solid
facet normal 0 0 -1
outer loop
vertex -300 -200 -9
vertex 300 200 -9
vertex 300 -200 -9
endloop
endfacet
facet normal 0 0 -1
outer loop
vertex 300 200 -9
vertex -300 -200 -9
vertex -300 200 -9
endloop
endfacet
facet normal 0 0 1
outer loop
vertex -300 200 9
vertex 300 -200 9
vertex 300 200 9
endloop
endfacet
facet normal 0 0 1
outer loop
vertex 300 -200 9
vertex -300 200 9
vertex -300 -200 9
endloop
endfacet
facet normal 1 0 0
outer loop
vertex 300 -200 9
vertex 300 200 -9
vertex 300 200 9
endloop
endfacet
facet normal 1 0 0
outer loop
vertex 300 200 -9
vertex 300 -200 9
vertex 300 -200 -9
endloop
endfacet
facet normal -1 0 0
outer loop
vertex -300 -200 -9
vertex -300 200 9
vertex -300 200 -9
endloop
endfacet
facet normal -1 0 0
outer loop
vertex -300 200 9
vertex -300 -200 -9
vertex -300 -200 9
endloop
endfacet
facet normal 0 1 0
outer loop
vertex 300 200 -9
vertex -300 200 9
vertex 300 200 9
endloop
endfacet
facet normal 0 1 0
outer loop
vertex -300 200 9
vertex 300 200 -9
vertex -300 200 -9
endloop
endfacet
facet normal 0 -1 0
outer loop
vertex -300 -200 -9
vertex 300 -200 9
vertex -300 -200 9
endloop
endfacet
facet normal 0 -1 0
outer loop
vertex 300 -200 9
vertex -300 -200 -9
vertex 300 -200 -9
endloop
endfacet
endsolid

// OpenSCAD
// Parameters
sheet_length = 600; //[300:1200:1]
sheet_width = 400; //[200:800:1]
sheet_thickness = 18; //[9:36:1]
edge_chamfer = 1.5; //[0.5:3:0.1]
corner_rounding = 6; //[2:12:0.5]
label_thickness = 0.6; //[0.2:1.5:0.1]
label_length = 60; //[30:120:1]
label_width = 20; //[10:50:1]
connect_overlap = 1; //[0.5:2:0.1]

// MDF Sheet Panel with Corner Rounding and Edge Chamfer
module mdf_sheet_panel() {
  color([0.85, 0.85, 0.8]) {
    // Base panel
    translate([0, 0, 0])
      cube([sheet_length, sheet_width, sheet_thickness], center=true);

    // Corner rounding
    for (x = [-1, 1], y = [-1, 1]) {
      translate([x * (sheet_length/2 - corner_rounding), y * (sheet_width/2 - corner_rounding), 0])
        cylinder(r=corner_rounding, h=sheet_thickness, center=true);
    }

    // Edge chamfer approximation
    offset(r=edge_chamfer) {
      translate([0, 0, 0])
        cube([sheet_length - 2*corner_rounding, sheet_width - 2*corner_rounding, sheet_thickness], center=true);
    }
  }
}

// Material Label
module material_label() {
  color([0.1, 0.1, 0.6]) {
    translate([sheet_length/2 - label_length/2 - connect_overlap, 
               sheet_width/2 - label_width/2 - connect_overlap, 
               sheet_thickness/2 + label_thickness/2 - connect_overlap])
      cube([label_length, label_width, label_thickness], center=true);
  }
}

// Final Model
union() {
  mdf_sheet_panel();
  material_label();
}
